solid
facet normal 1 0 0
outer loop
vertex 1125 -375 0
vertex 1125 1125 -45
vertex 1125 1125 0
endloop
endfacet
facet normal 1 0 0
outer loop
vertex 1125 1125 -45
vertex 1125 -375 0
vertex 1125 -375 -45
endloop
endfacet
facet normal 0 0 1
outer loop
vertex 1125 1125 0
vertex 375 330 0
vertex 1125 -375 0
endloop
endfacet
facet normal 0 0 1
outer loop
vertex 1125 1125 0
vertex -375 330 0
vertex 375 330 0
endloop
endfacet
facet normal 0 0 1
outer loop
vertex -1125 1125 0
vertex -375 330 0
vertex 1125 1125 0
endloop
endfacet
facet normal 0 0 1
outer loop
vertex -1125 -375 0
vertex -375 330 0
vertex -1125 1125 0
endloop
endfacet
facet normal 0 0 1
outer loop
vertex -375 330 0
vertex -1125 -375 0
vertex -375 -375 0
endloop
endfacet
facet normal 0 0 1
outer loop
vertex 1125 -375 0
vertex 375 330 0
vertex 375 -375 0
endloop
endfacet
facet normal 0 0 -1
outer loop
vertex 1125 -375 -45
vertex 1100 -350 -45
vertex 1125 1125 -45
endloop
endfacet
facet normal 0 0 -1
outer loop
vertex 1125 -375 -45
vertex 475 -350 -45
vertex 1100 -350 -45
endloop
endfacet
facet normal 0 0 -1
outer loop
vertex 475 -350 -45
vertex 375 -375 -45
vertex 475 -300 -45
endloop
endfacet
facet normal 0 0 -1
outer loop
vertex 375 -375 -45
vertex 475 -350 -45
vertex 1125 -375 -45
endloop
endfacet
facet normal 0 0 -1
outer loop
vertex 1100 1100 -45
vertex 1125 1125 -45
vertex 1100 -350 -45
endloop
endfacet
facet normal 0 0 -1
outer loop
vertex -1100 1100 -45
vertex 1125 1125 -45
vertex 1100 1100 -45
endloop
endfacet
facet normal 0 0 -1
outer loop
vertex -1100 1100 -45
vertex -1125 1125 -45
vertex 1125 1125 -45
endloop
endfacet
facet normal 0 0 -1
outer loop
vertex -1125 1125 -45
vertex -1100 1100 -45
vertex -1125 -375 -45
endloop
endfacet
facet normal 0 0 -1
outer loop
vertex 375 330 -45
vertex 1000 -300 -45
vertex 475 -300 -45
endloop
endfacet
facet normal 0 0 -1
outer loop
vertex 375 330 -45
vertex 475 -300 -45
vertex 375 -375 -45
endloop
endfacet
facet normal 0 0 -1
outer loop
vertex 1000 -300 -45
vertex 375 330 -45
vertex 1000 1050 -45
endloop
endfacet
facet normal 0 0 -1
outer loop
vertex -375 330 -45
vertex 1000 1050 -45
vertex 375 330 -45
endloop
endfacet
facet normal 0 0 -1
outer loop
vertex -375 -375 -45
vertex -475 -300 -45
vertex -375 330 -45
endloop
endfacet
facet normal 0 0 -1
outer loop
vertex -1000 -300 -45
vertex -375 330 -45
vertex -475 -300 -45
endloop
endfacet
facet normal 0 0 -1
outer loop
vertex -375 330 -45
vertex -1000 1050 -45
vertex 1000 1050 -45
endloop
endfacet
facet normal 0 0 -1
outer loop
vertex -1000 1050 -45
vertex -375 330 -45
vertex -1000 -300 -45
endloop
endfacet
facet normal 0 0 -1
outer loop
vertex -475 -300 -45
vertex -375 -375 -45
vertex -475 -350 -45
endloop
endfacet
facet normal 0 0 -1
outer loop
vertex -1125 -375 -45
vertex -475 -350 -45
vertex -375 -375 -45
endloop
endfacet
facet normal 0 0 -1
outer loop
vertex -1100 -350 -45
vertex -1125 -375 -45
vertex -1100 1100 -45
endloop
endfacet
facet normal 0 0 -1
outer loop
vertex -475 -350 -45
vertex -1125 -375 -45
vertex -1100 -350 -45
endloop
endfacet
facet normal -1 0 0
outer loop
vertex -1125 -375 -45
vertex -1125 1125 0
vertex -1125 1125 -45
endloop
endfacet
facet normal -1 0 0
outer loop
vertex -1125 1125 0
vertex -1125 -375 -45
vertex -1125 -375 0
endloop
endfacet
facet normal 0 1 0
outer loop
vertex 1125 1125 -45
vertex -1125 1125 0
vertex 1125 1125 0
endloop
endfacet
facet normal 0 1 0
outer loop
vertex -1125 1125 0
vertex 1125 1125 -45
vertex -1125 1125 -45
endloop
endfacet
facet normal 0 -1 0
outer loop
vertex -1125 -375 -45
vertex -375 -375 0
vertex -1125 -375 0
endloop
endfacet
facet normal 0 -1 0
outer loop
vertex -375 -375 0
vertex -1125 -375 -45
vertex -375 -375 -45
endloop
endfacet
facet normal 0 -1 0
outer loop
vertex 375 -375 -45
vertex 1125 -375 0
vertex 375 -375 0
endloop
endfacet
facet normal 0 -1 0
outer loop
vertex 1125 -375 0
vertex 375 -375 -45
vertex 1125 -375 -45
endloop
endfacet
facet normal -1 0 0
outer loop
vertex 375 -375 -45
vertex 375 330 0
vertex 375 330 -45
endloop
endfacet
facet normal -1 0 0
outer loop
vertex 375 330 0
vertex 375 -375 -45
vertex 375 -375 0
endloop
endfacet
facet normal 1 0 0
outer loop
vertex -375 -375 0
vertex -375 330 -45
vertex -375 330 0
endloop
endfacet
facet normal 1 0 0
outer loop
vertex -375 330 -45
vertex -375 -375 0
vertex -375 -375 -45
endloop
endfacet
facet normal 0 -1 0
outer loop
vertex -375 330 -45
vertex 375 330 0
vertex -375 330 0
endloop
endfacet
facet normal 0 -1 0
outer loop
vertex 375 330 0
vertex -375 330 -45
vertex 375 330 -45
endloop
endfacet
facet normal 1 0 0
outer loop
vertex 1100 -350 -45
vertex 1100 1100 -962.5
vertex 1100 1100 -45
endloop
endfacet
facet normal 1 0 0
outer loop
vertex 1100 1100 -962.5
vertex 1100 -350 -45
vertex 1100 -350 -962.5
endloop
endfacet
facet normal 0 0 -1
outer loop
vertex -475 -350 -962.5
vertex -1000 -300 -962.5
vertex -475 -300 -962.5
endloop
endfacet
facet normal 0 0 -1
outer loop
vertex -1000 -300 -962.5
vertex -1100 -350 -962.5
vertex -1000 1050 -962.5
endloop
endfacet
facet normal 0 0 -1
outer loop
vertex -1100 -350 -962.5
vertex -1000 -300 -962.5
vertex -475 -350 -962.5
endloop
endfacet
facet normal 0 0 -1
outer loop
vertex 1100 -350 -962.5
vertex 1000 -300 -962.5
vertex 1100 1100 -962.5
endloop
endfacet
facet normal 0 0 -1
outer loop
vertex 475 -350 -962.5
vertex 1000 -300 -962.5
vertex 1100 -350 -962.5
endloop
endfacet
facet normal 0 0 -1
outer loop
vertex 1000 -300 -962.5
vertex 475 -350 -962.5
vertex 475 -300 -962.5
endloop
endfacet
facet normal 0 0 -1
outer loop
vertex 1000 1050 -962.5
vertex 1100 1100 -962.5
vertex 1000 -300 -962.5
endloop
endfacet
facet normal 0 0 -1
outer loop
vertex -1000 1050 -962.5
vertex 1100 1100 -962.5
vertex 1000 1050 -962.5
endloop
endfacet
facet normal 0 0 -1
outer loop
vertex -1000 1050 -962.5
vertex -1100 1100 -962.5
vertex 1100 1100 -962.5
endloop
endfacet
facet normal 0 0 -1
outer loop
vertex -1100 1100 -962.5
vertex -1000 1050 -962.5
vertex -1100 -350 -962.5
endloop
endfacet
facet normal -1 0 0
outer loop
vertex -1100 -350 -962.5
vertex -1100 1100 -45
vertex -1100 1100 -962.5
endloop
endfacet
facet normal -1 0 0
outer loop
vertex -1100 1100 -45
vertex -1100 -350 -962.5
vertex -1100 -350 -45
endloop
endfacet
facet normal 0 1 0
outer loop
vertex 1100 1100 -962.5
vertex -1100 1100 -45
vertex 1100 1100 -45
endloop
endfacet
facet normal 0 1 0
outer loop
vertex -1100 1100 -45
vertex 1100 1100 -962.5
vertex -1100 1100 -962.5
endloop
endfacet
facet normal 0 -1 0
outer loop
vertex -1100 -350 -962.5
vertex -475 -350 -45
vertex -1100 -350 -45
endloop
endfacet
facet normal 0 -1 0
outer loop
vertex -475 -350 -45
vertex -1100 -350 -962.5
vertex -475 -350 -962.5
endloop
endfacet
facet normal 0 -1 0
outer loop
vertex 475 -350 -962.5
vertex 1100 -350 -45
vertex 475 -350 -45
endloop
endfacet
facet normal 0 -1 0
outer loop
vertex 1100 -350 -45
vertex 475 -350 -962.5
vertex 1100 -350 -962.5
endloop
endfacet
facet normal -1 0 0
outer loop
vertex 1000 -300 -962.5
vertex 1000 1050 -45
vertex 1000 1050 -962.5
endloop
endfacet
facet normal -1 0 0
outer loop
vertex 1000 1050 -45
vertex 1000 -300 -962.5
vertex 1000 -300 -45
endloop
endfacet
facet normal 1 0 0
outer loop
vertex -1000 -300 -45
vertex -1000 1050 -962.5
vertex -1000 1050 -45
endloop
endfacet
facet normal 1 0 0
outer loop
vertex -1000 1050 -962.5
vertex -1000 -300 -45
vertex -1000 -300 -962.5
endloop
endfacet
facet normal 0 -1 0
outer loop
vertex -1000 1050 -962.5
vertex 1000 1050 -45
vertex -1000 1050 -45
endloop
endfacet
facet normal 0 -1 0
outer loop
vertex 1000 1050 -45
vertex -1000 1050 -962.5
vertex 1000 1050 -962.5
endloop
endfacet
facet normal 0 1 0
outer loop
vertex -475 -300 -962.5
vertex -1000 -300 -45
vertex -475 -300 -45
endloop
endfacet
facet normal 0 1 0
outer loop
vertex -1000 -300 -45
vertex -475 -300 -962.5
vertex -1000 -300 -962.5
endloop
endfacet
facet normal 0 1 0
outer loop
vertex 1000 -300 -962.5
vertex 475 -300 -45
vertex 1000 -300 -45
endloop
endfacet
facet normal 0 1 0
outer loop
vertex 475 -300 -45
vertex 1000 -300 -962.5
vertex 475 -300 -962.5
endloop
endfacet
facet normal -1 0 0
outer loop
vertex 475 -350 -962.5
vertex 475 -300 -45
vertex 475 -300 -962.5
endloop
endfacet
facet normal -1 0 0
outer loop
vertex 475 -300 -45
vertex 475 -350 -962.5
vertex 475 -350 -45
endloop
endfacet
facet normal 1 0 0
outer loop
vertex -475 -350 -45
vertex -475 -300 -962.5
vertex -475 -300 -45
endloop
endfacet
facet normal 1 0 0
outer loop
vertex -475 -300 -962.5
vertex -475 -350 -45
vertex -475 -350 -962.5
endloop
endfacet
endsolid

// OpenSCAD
/**
 *
 * @licstart
 *
 * Copyright (C) 2017  AlephObjects, Inc.
 *
 *
 * The JavaScript code in this page is free software: you can
 * redistribute it and/or modify it under the terms of the GNU
 * General Public License (GNU GPL) as published by the Free Software
 * Foundation, either version 3 of the License, or (at your option)
 * any later version.  The code is distributed WITHOUT ANY WARRANTY;
 * without even the implied warranty of MERCHANTABILITY or FITNESS
 * FOR A PARTICULAR PURPOSE.  See the GNU GPL for more details.
 *
 * As additional permission under GNU GPL version 3 section 7, you
 * may distribute non-source (e.g., minimized or compacted) forms of
 * that code without the copy of the GNU GPL normally required by
 * section 4, provided you include this license notice and a URL
 * through which recipients can access the Corresponding Source.
 *
 * @licend
 *
 */

depth  = 750;
cutout = 750;
height = 940;
overhang = 50;
wall     = 100;

surface_depth = 45;
w=depth*2+cutout;
d=depth  +cutout;

module cut_out() {
	translate([0,-d/2+cutout/2-wall, 0])
		cube ([cutout, cutout+10+wall, 1000], center=true);
}

module bench_top() {
	difference() {
		cube ([w,d,surface_depth], center=true);
		cut_out();
	}
}

module base_cut_out() {
	translate([0,-d/2+cutout/2-wall, 0])
		cube ([cutout+wall*2, cutout+10+wall, height+2], center=true);
}

module bench_base() {
	translate([0,0, -height/2])
	difference() {
		cube ([w-overhang,d-overhang,height], center=true);
		cube ([w-overhang-wall*2,d-overhang-wall,height+1], center=true);
		base_cut_out();
	}
}

translate([0,cutout/2,-surface_depth/2]) {
	bench_top();
	bench_base();
}
